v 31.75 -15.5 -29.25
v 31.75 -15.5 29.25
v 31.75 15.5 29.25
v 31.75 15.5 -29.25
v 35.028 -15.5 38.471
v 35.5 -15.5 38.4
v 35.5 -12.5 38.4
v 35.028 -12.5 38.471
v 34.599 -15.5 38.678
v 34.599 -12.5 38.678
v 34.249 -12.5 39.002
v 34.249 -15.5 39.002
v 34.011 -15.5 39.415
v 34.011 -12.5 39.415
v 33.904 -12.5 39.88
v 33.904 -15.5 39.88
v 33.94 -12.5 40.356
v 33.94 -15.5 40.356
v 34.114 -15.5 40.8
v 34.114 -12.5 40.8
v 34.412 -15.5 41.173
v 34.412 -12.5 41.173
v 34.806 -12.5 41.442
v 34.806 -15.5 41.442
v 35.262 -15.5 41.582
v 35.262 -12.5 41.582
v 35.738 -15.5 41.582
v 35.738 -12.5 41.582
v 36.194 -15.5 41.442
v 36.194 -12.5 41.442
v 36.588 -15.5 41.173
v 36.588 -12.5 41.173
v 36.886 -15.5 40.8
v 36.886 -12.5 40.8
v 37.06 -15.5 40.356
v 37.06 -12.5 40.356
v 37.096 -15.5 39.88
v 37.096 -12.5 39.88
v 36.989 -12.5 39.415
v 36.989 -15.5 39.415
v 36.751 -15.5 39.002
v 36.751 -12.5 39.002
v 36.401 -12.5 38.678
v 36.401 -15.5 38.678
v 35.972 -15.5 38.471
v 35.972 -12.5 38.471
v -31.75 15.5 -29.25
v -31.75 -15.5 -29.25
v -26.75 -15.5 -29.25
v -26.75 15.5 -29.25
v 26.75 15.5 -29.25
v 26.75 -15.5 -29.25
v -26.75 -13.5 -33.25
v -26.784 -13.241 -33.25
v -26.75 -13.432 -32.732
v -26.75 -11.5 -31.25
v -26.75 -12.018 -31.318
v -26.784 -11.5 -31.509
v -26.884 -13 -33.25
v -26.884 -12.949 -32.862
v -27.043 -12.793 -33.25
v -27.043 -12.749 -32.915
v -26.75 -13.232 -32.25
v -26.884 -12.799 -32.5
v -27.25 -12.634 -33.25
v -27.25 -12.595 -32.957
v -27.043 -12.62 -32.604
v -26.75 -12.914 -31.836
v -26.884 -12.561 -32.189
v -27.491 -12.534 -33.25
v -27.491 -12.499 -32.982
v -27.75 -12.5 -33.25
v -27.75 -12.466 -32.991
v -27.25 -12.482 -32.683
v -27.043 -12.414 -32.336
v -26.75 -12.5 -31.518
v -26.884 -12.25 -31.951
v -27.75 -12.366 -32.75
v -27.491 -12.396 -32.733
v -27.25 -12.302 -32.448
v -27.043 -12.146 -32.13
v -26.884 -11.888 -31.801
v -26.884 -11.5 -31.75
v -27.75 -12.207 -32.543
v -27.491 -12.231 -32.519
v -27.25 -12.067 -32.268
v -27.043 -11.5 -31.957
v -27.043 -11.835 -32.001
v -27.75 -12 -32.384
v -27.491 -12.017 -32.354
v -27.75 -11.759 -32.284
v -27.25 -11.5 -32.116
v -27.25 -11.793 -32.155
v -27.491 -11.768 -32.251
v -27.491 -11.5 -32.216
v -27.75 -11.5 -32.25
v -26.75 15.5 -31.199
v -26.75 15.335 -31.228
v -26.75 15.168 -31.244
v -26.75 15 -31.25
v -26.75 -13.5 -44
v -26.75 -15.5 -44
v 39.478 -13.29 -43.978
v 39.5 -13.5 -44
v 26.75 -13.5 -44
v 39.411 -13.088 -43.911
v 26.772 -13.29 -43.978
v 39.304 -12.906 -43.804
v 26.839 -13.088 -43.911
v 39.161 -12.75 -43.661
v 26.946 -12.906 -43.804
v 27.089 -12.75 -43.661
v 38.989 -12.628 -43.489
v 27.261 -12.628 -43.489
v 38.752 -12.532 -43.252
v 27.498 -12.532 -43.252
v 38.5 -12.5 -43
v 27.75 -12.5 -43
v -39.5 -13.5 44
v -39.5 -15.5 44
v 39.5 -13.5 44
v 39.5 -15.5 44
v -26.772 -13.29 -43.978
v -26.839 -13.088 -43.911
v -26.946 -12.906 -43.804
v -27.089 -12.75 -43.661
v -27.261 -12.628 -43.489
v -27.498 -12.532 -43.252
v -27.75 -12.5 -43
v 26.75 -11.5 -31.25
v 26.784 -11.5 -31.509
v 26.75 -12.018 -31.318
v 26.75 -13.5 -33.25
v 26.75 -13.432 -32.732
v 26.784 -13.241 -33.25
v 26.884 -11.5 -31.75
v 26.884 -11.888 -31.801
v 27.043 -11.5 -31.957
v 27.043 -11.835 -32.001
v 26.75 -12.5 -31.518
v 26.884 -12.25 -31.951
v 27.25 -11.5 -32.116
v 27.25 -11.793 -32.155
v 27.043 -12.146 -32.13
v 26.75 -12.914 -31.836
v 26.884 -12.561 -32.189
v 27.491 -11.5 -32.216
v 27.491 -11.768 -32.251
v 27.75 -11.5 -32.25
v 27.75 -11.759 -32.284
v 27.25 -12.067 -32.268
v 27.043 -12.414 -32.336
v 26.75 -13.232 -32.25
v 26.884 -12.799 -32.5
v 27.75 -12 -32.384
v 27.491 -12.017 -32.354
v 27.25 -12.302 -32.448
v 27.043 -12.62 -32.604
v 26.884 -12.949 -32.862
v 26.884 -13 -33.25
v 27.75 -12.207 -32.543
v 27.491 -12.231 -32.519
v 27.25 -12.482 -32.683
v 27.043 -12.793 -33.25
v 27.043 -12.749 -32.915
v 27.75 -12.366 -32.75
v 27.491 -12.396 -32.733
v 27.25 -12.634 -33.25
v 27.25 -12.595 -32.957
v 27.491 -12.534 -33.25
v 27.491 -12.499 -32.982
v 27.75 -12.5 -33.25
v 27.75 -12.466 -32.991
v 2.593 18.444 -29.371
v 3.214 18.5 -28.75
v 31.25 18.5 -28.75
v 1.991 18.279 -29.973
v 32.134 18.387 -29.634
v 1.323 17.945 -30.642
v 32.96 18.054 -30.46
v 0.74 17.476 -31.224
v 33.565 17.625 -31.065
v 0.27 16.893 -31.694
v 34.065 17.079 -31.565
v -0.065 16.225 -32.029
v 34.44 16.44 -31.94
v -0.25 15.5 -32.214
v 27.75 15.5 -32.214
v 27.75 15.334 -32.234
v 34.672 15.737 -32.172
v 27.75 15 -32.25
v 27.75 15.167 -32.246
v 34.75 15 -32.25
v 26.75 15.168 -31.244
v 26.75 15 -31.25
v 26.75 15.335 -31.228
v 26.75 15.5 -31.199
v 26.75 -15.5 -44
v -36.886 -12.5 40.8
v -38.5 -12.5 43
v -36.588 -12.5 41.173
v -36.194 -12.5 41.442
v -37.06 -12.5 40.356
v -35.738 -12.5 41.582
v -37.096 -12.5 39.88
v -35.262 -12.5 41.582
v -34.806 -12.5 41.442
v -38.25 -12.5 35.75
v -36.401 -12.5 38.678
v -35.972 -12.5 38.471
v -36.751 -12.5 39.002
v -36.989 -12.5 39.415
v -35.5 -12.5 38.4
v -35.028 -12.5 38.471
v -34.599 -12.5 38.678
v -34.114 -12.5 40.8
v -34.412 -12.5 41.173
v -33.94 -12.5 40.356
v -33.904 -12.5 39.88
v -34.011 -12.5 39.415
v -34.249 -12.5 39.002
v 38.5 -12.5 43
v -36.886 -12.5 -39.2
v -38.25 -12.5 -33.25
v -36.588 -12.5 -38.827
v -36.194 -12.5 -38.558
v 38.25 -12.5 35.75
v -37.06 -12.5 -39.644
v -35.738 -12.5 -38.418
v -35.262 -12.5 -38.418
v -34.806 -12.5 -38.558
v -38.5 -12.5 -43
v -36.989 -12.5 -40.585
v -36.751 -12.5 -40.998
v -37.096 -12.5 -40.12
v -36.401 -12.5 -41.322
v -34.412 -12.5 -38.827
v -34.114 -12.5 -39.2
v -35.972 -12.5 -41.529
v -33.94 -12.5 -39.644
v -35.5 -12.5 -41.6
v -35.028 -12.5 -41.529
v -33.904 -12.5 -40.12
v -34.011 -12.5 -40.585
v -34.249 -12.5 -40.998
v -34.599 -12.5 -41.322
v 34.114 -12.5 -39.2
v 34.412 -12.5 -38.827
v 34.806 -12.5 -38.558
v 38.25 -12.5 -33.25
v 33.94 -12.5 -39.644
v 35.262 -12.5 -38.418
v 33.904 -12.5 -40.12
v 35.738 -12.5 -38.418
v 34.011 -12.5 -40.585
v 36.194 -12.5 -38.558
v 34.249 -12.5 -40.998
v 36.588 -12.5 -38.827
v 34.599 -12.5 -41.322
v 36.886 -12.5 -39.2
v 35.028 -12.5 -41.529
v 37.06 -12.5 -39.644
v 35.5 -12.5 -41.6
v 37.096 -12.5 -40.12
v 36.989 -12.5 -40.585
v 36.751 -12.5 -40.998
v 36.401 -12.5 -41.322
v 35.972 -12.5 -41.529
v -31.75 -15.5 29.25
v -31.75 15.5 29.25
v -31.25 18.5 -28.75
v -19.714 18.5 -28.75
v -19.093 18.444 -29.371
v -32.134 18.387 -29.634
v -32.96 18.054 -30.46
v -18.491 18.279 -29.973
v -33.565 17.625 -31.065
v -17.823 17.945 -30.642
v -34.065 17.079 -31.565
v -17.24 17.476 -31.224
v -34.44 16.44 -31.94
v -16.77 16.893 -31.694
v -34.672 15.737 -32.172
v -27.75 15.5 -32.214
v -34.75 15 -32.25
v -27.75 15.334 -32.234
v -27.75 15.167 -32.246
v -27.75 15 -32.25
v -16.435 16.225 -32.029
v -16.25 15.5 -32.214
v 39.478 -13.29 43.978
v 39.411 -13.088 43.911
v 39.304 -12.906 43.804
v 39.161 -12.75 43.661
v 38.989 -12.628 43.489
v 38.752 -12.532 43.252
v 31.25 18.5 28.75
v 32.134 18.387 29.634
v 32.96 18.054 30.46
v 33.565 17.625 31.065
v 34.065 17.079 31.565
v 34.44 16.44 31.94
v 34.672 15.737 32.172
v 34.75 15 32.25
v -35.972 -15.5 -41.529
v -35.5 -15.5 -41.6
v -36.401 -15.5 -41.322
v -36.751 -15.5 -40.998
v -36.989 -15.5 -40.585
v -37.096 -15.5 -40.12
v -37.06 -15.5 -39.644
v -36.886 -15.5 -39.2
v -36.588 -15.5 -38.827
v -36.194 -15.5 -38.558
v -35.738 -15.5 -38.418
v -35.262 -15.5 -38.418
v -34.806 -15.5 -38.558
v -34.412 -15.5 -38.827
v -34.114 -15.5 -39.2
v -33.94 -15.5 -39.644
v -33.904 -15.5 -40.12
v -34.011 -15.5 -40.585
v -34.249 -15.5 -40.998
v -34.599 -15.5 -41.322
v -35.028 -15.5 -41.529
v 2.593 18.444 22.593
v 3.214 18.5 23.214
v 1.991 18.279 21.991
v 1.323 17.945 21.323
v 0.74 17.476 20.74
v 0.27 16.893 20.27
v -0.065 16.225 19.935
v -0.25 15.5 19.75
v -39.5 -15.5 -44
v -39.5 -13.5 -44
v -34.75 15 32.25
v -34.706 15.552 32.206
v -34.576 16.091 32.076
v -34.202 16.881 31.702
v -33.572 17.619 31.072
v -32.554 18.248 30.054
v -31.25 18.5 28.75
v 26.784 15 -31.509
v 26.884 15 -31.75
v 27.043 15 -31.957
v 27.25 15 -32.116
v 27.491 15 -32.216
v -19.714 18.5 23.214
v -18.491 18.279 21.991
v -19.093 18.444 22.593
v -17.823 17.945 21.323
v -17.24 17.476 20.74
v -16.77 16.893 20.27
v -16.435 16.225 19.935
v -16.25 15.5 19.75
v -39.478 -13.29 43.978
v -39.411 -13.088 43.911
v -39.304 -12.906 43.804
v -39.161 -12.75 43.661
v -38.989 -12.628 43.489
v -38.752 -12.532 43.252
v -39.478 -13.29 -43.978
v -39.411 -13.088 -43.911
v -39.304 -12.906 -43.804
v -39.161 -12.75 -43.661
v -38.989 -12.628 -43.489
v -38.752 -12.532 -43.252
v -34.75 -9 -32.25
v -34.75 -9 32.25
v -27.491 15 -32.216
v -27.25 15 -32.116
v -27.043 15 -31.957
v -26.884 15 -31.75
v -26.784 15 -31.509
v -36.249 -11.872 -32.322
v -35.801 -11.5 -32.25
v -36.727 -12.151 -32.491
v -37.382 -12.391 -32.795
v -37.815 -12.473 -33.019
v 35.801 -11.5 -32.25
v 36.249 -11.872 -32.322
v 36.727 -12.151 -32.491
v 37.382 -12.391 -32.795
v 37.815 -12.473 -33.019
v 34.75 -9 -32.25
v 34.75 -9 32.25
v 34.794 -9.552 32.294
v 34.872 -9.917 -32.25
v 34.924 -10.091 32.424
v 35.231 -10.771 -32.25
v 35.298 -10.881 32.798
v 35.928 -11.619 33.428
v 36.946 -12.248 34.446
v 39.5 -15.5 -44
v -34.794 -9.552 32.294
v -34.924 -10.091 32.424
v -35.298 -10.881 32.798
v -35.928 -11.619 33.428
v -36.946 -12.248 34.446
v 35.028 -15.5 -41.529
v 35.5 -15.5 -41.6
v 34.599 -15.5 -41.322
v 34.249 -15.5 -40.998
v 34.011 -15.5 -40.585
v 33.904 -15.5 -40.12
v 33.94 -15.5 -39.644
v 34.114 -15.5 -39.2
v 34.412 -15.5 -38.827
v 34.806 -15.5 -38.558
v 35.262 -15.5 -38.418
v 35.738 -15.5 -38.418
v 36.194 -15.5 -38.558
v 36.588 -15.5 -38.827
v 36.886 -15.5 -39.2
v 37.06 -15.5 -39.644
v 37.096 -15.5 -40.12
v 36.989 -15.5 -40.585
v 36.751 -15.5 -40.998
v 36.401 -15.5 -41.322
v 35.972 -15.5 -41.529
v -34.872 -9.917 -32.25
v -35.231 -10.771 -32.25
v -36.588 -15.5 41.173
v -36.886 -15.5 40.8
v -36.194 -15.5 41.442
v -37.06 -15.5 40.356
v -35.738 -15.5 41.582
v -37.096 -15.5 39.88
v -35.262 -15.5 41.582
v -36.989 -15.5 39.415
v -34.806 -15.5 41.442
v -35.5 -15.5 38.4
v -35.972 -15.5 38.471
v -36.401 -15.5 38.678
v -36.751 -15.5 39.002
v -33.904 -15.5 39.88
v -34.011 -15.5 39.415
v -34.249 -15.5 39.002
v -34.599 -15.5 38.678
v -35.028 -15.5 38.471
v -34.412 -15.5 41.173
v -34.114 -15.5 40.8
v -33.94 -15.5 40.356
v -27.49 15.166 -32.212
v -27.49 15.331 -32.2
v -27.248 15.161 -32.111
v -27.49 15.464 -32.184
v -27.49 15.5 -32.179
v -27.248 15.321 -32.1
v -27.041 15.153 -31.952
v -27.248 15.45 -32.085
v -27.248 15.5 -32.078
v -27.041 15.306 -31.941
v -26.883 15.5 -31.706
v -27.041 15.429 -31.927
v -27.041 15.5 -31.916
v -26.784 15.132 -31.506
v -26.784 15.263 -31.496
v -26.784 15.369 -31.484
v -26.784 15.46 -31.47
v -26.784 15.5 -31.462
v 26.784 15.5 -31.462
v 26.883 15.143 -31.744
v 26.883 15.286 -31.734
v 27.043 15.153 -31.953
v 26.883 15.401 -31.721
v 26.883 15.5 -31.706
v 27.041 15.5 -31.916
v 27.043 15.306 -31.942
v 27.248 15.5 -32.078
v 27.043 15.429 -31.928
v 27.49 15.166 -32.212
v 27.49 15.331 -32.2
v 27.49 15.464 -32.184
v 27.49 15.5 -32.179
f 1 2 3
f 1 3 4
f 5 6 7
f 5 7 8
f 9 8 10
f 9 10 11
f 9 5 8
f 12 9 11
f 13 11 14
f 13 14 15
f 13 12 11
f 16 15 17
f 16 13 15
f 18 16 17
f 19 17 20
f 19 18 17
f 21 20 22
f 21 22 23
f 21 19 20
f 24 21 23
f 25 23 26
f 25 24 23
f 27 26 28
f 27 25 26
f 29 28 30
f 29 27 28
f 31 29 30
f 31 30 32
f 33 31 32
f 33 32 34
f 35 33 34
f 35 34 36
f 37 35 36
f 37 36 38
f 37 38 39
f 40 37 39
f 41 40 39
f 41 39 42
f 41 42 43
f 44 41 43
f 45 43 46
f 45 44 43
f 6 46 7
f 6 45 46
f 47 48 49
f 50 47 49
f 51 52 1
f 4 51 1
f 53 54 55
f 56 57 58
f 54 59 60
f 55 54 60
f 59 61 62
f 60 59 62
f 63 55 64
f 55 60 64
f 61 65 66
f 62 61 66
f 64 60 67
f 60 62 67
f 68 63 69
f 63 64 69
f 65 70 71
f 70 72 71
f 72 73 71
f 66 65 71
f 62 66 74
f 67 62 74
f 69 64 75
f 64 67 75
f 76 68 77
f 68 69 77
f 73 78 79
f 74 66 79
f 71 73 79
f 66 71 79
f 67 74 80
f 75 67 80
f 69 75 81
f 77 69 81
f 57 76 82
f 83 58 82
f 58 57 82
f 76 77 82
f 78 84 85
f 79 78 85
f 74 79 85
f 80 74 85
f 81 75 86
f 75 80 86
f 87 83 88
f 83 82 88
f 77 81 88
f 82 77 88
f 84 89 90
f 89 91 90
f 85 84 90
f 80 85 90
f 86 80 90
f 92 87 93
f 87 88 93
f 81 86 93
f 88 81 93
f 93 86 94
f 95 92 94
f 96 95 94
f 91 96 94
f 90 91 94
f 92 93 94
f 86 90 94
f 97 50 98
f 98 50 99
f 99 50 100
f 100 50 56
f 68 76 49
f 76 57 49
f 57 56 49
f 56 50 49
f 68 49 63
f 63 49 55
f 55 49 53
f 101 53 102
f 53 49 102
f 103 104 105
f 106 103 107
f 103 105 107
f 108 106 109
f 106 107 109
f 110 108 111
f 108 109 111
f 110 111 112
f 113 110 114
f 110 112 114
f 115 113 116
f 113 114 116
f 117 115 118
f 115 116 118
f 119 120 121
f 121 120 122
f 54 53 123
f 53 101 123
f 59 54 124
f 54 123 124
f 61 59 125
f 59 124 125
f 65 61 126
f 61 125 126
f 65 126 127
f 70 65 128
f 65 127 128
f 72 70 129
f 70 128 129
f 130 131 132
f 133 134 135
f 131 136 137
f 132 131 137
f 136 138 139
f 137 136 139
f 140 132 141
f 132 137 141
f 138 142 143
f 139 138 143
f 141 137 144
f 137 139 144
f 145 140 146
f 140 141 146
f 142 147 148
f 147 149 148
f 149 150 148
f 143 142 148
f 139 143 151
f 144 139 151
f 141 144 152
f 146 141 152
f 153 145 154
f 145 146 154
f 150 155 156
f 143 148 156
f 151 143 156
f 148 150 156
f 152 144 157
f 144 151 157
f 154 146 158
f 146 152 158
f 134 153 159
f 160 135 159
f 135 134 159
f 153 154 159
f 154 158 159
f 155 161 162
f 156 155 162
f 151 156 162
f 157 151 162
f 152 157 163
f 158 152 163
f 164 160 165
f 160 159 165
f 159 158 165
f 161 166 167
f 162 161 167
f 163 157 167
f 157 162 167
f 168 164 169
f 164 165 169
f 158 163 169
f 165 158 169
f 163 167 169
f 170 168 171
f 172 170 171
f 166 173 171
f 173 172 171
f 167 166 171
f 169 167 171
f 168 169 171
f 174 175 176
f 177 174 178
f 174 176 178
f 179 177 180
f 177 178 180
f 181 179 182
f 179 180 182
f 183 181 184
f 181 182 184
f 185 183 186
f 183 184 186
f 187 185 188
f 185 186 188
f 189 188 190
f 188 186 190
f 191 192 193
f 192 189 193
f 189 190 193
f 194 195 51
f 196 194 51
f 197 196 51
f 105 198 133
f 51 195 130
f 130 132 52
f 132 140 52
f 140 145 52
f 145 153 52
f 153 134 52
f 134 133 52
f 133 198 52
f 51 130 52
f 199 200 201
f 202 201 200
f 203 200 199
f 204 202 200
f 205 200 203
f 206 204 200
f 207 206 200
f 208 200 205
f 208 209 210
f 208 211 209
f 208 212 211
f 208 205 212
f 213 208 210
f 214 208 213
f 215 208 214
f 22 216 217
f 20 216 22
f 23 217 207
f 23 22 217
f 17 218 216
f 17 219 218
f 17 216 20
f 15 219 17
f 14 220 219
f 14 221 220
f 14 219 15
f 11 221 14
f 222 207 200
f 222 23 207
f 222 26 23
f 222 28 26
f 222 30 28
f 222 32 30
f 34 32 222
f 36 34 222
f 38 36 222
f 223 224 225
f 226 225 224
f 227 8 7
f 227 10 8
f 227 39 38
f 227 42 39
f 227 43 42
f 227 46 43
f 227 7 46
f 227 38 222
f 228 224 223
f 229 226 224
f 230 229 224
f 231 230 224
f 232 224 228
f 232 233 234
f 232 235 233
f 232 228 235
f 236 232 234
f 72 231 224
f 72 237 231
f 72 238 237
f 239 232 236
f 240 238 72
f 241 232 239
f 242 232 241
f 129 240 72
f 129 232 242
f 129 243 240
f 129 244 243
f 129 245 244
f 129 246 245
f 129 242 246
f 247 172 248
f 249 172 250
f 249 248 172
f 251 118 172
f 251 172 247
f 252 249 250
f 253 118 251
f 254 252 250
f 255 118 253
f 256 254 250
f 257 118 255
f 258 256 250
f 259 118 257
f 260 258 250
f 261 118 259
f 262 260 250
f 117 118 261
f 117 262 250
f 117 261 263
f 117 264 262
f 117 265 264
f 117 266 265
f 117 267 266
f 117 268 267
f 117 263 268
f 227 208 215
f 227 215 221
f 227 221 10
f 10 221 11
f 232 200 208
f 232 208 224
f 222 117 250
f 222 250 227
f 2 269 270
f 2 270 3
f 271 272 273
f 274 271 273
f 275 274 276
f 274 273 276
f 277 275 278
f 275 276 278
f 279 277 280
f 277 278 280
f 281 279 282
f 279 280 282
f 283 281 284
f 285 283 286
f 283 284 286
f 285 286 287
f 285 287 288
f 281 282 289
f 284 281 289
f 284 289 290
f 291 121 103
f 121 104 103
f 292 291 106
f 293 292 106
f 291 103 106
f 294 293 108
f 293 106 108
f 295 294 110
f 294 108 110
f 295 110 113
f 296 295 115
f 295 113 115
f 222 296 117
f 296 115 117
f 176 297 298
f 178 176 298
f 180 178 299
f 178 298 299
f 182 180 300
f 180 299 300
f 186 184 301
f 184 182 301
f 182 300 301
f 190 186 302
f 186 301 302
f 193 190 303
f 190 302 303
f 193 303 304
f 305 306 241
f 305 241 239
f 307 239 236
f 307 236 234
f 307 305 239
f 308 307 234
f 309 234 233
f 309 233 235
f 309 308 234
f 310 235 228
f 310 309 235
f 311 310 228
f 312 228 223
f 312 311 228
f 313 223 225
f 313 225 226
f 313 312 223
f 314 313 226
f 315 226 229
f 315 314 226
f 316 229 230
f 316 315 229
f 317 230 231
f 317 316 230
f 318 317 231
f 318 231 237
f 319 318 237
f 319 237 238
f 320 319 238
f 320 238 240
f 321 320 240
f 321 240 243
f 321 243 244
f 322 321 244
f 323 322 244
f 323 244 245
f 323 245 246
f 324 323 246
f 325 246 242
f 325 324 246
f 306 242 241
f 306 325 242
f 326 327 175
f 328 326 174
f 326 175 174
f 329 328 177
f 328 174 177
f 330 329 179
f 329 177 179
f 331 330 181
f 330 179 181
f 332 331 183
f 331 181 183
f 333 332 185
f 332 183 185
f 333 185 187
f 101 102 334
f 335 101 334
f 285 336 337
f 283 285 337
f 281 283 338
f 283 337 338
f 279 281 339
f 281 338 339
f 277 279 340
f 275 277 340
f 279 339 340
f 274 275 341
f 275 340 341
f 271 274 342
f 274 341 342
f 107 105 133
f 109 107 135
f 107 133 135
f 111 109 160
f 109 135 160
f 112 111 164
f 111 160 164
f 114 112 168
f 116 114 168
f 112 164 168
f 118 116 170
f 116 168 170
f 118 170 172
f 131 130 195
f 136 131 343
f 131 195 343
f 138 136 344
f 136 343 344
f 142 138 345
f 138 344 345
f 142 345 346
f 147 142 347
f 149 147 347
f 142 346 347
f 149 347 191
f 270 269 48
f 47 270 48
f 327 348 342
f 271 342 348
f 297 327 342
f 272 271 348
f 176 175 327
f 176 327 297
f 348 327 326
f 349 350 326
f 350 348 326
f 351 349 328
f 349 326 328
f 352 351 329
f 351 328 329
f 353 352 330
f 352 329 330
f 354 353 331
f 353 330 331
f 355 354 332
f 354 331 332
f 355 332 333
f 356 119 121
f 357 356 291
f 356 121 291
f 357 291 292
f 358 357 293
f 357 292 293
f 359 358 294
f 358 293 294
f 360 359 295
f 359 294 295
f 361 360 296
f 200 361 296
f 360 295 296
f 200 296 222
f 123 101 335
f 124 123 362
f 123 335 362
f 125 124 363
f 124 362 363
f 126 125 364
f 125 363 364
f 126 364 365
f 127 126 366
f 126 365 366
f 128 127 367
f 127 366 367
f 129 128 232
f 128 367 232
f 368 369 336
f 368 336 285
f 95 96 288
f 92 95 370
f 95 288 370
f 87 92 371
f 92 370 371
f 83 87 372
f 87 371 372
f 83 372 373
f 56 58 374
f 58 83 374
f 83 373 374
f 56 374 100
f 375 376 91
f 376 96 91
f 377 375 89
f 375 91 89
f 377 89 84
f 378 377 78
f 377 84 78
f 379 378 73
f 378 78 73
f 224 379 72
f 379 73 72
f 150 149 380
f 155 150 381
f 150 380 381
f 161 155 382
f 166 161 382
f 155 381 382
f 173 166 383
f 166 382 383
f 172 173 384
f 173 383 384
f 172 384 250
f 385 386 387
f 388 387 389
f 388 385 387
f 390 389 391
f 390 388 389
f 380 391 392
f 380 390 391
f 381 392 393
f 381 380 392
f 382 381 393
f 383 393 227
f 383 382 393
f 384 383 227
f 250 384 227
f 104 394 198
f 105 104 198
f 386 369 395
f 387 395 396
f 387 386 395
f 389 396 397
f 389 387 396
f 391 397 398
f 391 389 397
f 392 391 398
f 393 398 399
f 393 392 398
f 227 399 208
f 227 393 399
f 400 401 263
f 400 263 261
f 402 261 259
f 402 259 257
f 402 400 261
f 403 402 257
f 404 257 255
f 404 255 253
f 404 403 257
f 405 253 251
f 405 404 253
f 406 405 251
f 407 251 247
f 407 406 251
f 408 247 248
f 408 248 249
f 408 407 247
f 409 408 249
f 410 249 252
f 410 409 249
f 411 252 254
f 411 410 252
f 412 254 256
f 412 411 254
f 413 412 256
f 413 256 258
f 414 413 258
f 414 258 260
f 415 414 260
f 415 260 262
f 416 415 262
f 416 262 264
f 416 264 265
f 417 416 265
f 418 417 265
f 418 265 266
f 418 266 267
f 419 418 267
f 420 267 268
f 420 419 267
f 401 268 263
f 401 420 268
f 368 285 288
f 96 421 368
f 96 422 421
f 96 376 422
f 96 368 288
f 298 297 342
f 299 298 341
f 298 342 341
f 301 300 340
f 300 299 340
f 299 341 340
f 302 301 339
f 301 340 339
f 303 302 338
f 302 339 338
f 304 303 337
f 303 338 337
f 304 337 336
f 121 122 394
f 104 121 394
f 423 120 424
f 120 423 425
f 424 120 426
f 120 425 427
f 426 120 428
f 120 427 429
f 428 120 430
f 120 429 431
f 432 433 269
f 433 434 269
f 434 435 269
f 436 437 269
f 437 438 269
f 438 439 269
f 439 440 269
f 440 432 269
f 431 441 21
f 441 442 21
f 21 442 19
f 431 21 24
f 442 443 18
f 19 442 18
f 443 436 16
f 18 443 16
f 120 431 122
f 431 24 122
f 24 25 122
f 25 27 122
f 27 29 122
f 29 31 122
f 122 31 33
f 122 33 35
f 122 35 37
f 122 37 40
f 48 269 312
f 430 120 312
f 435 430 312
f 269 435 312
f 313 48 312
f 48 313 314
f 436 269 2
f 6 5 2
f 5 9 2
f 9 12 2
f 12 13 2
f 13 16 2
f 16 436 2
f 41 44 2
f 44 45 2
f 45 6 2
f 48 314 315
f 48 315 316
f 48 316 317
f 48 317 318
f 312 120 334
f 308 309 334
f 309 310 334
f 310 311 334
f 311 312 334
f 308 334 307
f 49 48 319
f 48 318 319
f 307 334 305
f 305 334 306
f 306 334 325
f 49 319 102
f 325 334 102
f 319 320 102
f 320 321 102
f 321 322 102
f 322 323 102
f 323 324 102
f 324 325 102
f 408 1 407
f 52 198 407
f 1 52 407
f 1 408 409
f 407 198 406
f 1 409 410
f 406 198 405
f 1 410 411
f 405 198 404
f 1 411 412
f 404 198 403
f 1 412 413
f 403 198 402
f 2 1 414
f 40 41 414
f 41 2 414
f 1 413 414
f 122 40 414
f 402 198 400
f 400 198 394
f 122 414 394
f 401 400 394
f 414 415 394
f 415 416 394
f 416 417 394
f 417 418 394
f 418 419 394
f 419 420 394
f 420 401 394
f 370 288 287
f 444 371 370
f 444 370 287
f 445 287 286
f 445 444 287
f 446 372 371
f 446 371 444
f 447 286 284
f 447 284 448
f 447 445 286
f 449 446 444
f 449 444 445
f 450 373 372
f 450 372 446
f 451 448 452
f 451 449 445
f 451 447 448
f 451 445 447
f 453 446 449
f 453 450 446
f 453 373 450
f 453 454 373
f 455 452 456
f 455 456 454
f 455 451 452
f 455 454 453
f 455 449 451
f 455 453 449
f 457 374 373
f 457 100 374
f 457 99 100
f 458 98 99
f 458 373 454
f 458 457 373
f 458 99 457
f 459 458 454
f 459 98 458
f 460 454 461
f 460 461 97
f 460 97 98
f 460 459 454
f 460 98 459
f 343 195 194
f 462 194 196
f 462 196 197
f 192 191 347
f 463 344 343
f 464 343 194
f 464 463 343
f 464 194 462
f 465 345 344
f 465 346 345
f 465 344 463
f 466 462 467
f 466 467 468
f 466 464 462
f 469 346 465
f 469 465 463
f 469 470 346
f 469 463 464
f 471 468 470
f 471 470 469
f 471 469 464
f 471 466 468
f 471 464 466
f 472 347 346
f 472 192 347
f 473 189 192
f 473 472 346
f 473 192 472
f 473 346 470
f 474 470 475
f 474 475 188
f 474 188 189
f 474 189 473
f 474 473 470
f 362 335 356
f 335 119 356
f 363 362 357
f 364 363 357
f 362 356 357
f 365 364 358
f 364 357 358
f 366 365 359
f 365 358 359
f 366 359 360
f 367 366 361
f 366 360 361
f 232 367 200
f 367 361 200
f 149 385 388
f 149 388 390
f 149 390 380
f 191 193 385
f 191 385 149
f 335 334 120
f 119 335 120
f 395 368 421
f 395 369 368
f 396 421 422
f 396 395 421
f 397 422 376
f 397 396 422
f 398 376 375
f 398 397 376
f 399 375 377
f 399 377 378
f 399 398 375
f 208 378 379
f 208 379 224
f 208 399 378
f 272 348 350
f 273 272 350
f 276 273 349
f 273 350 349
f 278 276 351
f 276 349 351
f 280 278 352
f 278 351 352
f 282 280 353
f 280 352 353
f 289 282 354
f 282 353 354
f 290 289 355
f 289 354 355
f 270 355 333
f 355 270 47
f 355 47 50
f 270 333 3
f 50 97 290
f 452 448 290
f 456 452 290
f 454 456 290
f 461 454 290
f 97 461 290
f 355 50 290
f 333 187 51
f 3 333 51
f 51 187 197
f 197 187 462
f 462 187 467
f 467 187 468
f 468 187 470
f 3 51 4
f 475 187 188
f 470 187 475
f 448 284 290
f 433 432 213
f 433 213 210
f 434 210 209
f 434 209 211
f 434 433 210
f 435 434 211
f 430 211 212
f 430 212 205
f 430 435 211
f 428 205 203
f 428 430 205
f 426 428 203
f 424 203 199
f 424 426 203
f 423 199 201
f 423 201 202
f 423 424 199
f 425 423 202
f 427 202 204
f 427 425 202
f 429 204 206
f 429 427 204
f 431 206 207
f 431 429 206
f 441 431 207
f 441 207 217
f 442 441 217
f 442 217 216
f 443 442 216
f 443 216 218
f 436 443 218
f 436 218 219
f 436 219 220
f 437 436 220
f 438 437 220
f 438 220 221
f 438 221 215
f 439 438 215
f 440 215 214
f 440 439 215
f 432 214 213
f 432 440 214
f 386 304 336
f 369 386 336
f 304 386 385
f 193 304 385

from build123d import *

# Parameters (mm, degrees)
BOSS_EXTRUDE1_DEPTH      = 15.5
BOSS_EXTRUDE1_DEPTH_BACK = 15.5
SKETCH1_W                = 63.5
SKETCH1_H                = 58.5
SHELL1_T                 = 3
SKETCH2_W                = 16
SKETCH2_H                = 52
CUT_EXTRUDE1_DEPTH       = 39.5
SKETCH3_W                = 53.5
SKETCH3_H                = 31
CUT_EXTRUDE2_DEPTH       = 39.5
BOSS_EXTRUDE2_START      = -15.5
SKETCH4_R                = 1.6
BOSS_EXTRUDE2_DEPTH      = 3
FILLET1_R                = 3.5
FILLET2_R                = 1


with BuildPart() as part:
    # Sketch1 → Boss-Extrude1 (new, two sides: drawn at the far end of the back side and taken through both)
    with BuildSketch(Plane(origin=(0, 0, 0), x_dir=(1, 0, 0), z_dir=(0, 1, 0)).offset(-BOSS_EXTRUDE1_DEPTH_BACK)):
        Rectangle(SKETCH1_W, SKETCH1_H)
    extrude(amount=BOSS_EXTRUDE1_DEPTH + BOSS_EXTRUDE1_DEPTH_BACK)

    # Shell1
    shell1_openings = [part.faces().sort_by_distance(p)[0] for p in [
        (0, -15.5, 0),
    ]]
    offset(amount=SHELL1_T, openings=shell1_openings, kind=Kind.INTERSECTION)

    # Sketch2 → Cut-Extrude1 (cut)
    with BuildSketch(Plane(origin=(0, 18.5, 0), x_dir=(1, 0, 0), z_dir=(0, 1, 0))):
        with Locations((-8.25, 6.25)):
            Rectangle(SKETCH2_W, SKETCH2_H)
    extrude(amount=-CUT_EXTRUDE1_DEPTH, mode=Mode.SUBTRACT)

    # Sketch3 → Cut-Extrude2 (cut)
    with BuildSketch(Plane(origin=(0, 0, -32.25), x_dir=(-1, 0, 0), z_dir=(0, 0, -1))):
        Rectangle(SKETCH3_W, SKETCH3_H)
    extrude(amount=-CUT_EXTRUDE2_DEPTH, mode=Mode.SUBTRACT)

    # Sketch4 → Boss-Extrude2 (add)
    with BuildSketch(Plane(origin=(0, 0, 0), x_dir=(1, 0, 0), z_dir=(0, 1, 0)).offset(BOSS_EXTRUDE2_START)):
        Polygon((-26.75, 32.25), (-26.75, 44), (-39.5, 44), (-39.5, -44), (39.5, -44), (39.5, 44), (26.75, 44), (26.75, 32.25), (34.75, 32.25), (34.75, -32.25), (-34.75, -32.25), (-34.75, 32.25), align=None)
        with Locations(Location((-35.5, 40, 0), (0, 0, 90))):
            Circle(SKETCH4_R, mode=Mode.SUBTRACT)
        with Locations(Location((-35.5, -40, 0), (0, 0, 90))):
            Circle(SKETCH4_R, mode=Mode.SUBTRACT)
        with Locations(Location((35.5, -40, 0), (0, 0, 90))):
            Circle(SKETCH4_R, mode=Mode.SUBTRACT)
        with Locations(Location((35.5, 40, 0), (0, 0, 90))):
            Circle(SKETCH4_R, mode=Mode.SUBTRACT)
    extrude(amount=BOSS_EXTRUDE2_DEPTH)

    # Fillet1
    # the kernel refuses this fillet: 3.5 mm, written as the material it adds along each edge
    with BuildSketch(Plane(origin=(34.75, -12.5, -32.25), x_dir=(1, 0, 0), z_dir=(0, 0, 1)), Plane(origin=(-34.75, -12.5, 32.25), x_dir=(-1, 0, 0), z_dir=(0, 0, -1))) as fillet1_piece_1:
        with BuildLine():
            CenterArc((FILLET1_R, FILLET1_R), FILLET1_R, 180, 90)
            Line((0, FILLET1_R), (0, 0))
            Line((0, 0), (FILLET1_R, 0))
        make_face()
    extrude(amount=64.5)
    with BuildSketch(Plane(origin=(34.75, -12.5, 32.25), x_dir=(0, 0, 1), z_dir=(-1, 0, 0))) as fillet1_piece_2:
        with BuildLine():
            CenterArc((FILLET1_R, FILLET1_R), FILLET1_R, 180, 90)
            Line((0, FILLET1_R), (0, 0))
            Line((0, 0), (FILLET1_R, 0))
        make_face()
    extrude(amount=69.5)
    with BuildSketch(Plane(origin=(34.75, -12.5, -32.25), x_dir=(1, 0, 0), z_dir=(0, 0, 1))) as fillet1_piece_3a_section:
        with BuildLine():
            CenterArc((FILLET1_R, FILLET1_R), FILLET1_R, 180, 90)
            Line((0, FILLET1_R), (0, 0))
            Line((0, 0), (FILLET1_R, 0))
        make_face()
    fillet1_piece_3a = extrude(amount=73.25, mode=Mode.PRIVATE)
    fillet1_piece_3a = fillet1_piece_3a - Plane(origin=(35.5, -12.5, 40), x_dir=(0, 0, -1), z_dir=(0, -1, 0)) * Cylinder(1.6, 161, mode=Mode.PRIVATE)
    fillet1_piece_3a = split(fillet1_piece_3a, bisect_by=Plane(origin=(34.75, -12.5, 32.25), z_dir=(0, 0, 1)), keep=Keep.TOP, mode=Mode.PRIVATE)
    with BuildSketch(Plane(origin=(43.5, -12.5, 32.25), x_dir=(0, 0, 1), z_dir=(-1, 0, 0))) as fillet1_piece_3b_section:
        with BuildLine():
            CenterArc((FILLET1_R, FILLET1_R), FILLET1_R, 180, 90)
            Line((0, FILLET1_R), (0, 0))
            Line((0, 0), (FILLET1_R, 0))
        make_face()
    fillet1_piece_3b = extrude(amount=78.25, mode=Mode.PRIVATE)
    fillet1_piece_3b = split(fillet1_piece_3b, bisect_by=Plane(origin=(39.5, -12.5, 32.25), z_dir=(-1, 0, 0)), keep=Keep.TOP, mode=Mode.PRIVATE)
    fillet1_piece_3b = split(fillet1_piece_3b, bisect_by=Plane(origin=(34.75, -12.5, 32.25), z_dir=(1, 0, 0)), keep=Keep.TOP, mode=Mode.PRIVATE)
    fillet1_piece_3 = fillet1_piece_3a & fillet1_piece_3b
    add(fillet1_piece_3)
    with BuildSketch(Plane(origin=(34.75, -12.5, 32.25), x_dir=(0, 0, 1), z_dir=(-1, 0, 0))) as fillet1_piece_4a_section:
        with BuildLine():
            CenterArc((FILLET1_R, FILLET1_R), FILLET1_R, 180, 90)
            Line((0, FILLET1_R), (0, 0))
            Line((0, 0), (FILLET1_R, 0))
        make_face()
    fillet1_piece_4a = extrude(amount=78.25, mode=Mode.PRIVATE)
    fillet1_piece_4a = split(fillet1_piece_4a, bisect_by=Plane(origin=(-39.5, -12.5, 32.25), z_dir=(1, 0, 0)), keep=Keep.TOP, mode=Mode.PRIVATE)
    fillet1_piece_4a = split(fillet1_piece_4a, bisect_by=Plane(origin=(-34.75, -12.5, 32.25), z_dir=(-1, 0, 0)), keep=Keep.TOP, mode=Mode.PRIVATE)
    with BuildSketch(Plane(origin=(-34.75, -12.5, 41), x_dir=(-1, 0, 0), z_dir=(0, 0, -1))) as fillet1_piece_4b_section:
        with BuildLine():
            CenterArc((FILLET1_R, FILLET1_R), FILLET1_R, 180, 90)
            Line((0, FILLET1_R), (0, 0))
            Line((0, 0), (FILLET1_R, 0))
        make_face()
    fillet1_piece_4b = extrude(amount=73.25, mode=Mode.PRIVATE)
    fillet1_piece_4b = fillet1_piece_4b - Plane(origin=(-35.5, -12.5, 40), x_dir=(0, 0, -1), z_dir=(0, -1, 0)) * Cylinder(1.6, 161, mode=Mode.PRIVATE)
    fillet1_piece_4b = split(fillet1_piece_4b, bisect_by=Plane(origin=(-34.75, -12.5, 32.25), z_dir=(0, 0, 1)), keep=Keep.TOP, mode=Mode.PRIVATE)
    fillet1_piece_4 = fillet1_piece_4a & fillet1_piece_4b
    add(fillet1_piece_4)
    # the kernel refuses this fillet: 3.5 mm, written as the material it takes off along each edge
    with BuildSketch(Plane(origin=(-0.25, 18.5, 19.75), x_dir=(0, 0, 1), z_dir=(-1, 0, 0))) as fillet1_2_piece_1:
        with BuildLine():
            CenterArc((3.464101615, -3.5), FILLET1_R, 90, 81.786789298)
            Line((0, -3), (0, 0))
            Line((0, 0), (3.464101615, 0))
        make_face()
    extrude(amount=16, mode=Mode.SUBTRACT)
    with BuildSketch(Plane(origin=(-0.25, 18.5, -40.910254038), x_dir=(1, 0, 0), z_dir=(0, 0, 1)), Plane(origin=(-16.25, 18.5, 19.75), x_dir=(-1, 0, 0), z_dir=(0, 0, -1))) as fillet1_2_piece_2:
        with BuildLine():
            CenterArc((3.464101615, -3.5), FILLET1_R, 90, 81.786789298)
            Line((0, -3), (0, 0))
            Line((0, 0), (3.464101615, 0))
        make_face()
    extrude(amount=60.660254038, mode=Mode.SUBTRACT)
    with BuildSketch(Plane(origin=(-7.5, 18.5, -32.25), x_dir=(0, 0, 1), z_dir=(-1, 0, 0))) as fillet1_2_piece_3:
        with BuildLine():
            CenterArc((FILLET1_R, -FILLET1_R), FILLET1_R, 90, 90)
            Line((0, -FILLET1_R), (0, 0))
            Line((0, 0), (FILLET1_R, 0))
        make_face()
    extrude(amount=36, mode=Mode.SUBTRACT)
    with BuildSketch(Plane(origin=(43.5, 18.5, -32.25), x_dir=(0, 0, 1), z_dir=(-1, 0, 0))) as fillet1_2_piece_4:
        with BuildLine():
            CenterArc((FILLET1_R, -FILLET1_R), FILLET1_R, 90, 90)
            Line((0, -FILLET1_R), (0, 0))
            Line((0, 0), (FILLET1_R, 0))
        make_face()
    extrude(amount=52.5, mode=Mode.SUBTRACT)
    with BuildSketch(Plane(origin=(-34.75, 18.5, 41), x_dir=(0, -1, 0), z_dir=(0, 0, -1))) as fillet1_2_piece_5:
        with BuildLine():
            CenterArc((FILLET1_R, -FILLET1_R), FILLET1_R, 90, 90)
            Line((0, -FILLET1_R), (0, 0))
            Line((0, 0), (FILLET1_R, 0))
        make_face()
    extrude(amount=82, mode=Mode.SUBTRACT)
    with BuildSketch(Plane(origin=(34.75, 18.5, 41), x_dir=(0, -1, 0), z_dir=(0, 0, -1))) as fillet1_2_piece_6:
        with BuildLine():
            CenterArc((FILLET1_R, FILLET1_R), FILLET1_R, 180, 90)
            Line((0, FILLET1_R), (0, 0))
            Line((0, 0), (FILLET1_R, 0))
        make_face()
    extrude(amount=82, mode=Mode.SUBTRACT)
    with BuildSketch(Plane(origin=(-43.5, 18.5, 32.25), x_dir=(0, -1, 0), z_dir=(1, 0, 0))) as fillet1_2_piece_7:
        with BuildLine():
            CenterArc((FILLET1_R, FILLET1_R), FILLET1_R, 180, 90)
            Line((0, FILLET1_R), (0, 0))
            Line((0, 0), (FILLET1_R, 0))
        make_face()
    extrude(amount=87, mode=Mode.SUBTRACT)
    with BuildSketch(Plane(origin=(8.410254038, 18.5, 19.75), x_dir=(0, 0, 1), z_dir=(-1, 0, 0))) as fillet1_2_piece_8a_section:
        with BuildLine():
            CenterArc((3.464101615, -3.5), FILLET1_R, 90, 81.786789298)
            Line((0, -3), (0, 0))
            Line((0, 0), (3.464101615, 0))
        make_face()
    fillet1_2_piece_8a = extrude(amount=24.660254038, mode=Mode.PRIVATE)
    fillet1_2_piece_8a = split(fillet1_2_piece_8a, bisect_by=Plane(origin=(-0.25, 18.5, 19.75), z_dir=(1, 0, 0)), keep=Keep.TOP, mode=Mode.PRIVATE)
    with BuildSketch(Plane(origin=(-0.25, 18.5, -32.25), x_dir=(1, 0, 0), z_dir=(0, 0, 1))) as fillet1_2_piece_8b_section:
        with BuildLine():
            CenterArc((3.464101615, -3.5), FILLET1_R, 90, 81.786789298)
            Line((0, -3), (0, 0))
            Line((0, 0), (3.464101615, 0))
        make_face()
    fillet1_2_piece_8b = extrude(amount=60.660254038, mode=Mode.PRIVATE)
    fillet1_2_piece_8b = split(fillet1_2_piece_8b, bisect_by=Plane(origin=(-0.25, 18.5, 19.75), z_dir=(0, 0, 1)), keep=Keep.TOP, mode=Mode.PRIVATE)
    fillet1_2_piece_8 = fillet1_2_piece_8a & fillet1_2_piece_8b
    add(fillet1_2_piece_8, mode=Mode.SUBTRACT)
    with BuildSketch(Plane(origin=(-16.25, 18.5, 28.410254038), x_dir=(-1, 0, 0), z_dir=(0, 0, -1))) as fillet1_2_piece_9a_section:
        with BuildLine():
            CenterArc((3.464101615, -3.5), FILLET1_R, 90, 81.786789298)
            Line((0, -3), (0, 0))
            Line((0, 0), (3.464101615, 0))
        make_face()
    fillet1_2_piece_9a = extrude(amount=60.660254038, mode=Mode.PRIVATE)
    fillet1_2_piece_9a = split(fillet1_2_piece_9a, bisect_by=Plane(origin=(-16.25, 18.5, 19.75), z_dir=(0, 0, 1)), keep=Keep.TOP, mode=Mode.PRIVATE)
    with BuildSketch(Plane(origin=(-0.25, 18.5, 19.75), x_dir=(0, 0, 1), z_dir=(-1, 0, 0))) as fillet1_2_piece_9b_section:
        with BuildLine():
            CenterArc((3.464101615, -3.5), FILLET1_R, 90, 81.786789298)
            Line((0, -3), (0, 0))
            Line((0, 0), (3.464101615, 0))
        make_face()
    fillet1_2_piece_9b = extrude(amount=24.660254038, mode=Mode.PRIVATE)
    fillet1_2_piece_9b = split(fillet1_2_piece_9b, bisect_by=Plane(origin=(-16.25, 18.5, 19.75), z_dir=(-1, 0, 0)), keep=Keep.TOP, mode=Mode.PRIVATE)
    fillet1_2_piece_9 = fillet1_2_piece_9a & fillet1_2_piece_9b
    add(fillet1_2_piece_9, mode=Mode.SUBTRACT)

    # Fillet2
    fillet2_edges = [part.edges().sort_by_distance(p)[0] for p in [
        (26.75, -12.5, -38.125),
        (32.5, -12.5, -32.25),
        (-32.5, -12.5, -32.25),
        (-26.75, -12.5, -38.125),
        (-33.125, -12.5, -44),
        (-39.5, -12.5, 0),
        (0, -12.5, 44),
        (39.5, -12.5, 0),
        (33.125, -12.5, -44),
        (-26.75, 15.250643519, -32.241013868),
        (26.75, 1.25, -32.25),
        (26.75, 15.250643519, -32.241013868),
        (-26.75, 1.25, -32.25),
    ]]
    fillet(fillet2_edges, radius=FILLET2_R)


solid = part.part
